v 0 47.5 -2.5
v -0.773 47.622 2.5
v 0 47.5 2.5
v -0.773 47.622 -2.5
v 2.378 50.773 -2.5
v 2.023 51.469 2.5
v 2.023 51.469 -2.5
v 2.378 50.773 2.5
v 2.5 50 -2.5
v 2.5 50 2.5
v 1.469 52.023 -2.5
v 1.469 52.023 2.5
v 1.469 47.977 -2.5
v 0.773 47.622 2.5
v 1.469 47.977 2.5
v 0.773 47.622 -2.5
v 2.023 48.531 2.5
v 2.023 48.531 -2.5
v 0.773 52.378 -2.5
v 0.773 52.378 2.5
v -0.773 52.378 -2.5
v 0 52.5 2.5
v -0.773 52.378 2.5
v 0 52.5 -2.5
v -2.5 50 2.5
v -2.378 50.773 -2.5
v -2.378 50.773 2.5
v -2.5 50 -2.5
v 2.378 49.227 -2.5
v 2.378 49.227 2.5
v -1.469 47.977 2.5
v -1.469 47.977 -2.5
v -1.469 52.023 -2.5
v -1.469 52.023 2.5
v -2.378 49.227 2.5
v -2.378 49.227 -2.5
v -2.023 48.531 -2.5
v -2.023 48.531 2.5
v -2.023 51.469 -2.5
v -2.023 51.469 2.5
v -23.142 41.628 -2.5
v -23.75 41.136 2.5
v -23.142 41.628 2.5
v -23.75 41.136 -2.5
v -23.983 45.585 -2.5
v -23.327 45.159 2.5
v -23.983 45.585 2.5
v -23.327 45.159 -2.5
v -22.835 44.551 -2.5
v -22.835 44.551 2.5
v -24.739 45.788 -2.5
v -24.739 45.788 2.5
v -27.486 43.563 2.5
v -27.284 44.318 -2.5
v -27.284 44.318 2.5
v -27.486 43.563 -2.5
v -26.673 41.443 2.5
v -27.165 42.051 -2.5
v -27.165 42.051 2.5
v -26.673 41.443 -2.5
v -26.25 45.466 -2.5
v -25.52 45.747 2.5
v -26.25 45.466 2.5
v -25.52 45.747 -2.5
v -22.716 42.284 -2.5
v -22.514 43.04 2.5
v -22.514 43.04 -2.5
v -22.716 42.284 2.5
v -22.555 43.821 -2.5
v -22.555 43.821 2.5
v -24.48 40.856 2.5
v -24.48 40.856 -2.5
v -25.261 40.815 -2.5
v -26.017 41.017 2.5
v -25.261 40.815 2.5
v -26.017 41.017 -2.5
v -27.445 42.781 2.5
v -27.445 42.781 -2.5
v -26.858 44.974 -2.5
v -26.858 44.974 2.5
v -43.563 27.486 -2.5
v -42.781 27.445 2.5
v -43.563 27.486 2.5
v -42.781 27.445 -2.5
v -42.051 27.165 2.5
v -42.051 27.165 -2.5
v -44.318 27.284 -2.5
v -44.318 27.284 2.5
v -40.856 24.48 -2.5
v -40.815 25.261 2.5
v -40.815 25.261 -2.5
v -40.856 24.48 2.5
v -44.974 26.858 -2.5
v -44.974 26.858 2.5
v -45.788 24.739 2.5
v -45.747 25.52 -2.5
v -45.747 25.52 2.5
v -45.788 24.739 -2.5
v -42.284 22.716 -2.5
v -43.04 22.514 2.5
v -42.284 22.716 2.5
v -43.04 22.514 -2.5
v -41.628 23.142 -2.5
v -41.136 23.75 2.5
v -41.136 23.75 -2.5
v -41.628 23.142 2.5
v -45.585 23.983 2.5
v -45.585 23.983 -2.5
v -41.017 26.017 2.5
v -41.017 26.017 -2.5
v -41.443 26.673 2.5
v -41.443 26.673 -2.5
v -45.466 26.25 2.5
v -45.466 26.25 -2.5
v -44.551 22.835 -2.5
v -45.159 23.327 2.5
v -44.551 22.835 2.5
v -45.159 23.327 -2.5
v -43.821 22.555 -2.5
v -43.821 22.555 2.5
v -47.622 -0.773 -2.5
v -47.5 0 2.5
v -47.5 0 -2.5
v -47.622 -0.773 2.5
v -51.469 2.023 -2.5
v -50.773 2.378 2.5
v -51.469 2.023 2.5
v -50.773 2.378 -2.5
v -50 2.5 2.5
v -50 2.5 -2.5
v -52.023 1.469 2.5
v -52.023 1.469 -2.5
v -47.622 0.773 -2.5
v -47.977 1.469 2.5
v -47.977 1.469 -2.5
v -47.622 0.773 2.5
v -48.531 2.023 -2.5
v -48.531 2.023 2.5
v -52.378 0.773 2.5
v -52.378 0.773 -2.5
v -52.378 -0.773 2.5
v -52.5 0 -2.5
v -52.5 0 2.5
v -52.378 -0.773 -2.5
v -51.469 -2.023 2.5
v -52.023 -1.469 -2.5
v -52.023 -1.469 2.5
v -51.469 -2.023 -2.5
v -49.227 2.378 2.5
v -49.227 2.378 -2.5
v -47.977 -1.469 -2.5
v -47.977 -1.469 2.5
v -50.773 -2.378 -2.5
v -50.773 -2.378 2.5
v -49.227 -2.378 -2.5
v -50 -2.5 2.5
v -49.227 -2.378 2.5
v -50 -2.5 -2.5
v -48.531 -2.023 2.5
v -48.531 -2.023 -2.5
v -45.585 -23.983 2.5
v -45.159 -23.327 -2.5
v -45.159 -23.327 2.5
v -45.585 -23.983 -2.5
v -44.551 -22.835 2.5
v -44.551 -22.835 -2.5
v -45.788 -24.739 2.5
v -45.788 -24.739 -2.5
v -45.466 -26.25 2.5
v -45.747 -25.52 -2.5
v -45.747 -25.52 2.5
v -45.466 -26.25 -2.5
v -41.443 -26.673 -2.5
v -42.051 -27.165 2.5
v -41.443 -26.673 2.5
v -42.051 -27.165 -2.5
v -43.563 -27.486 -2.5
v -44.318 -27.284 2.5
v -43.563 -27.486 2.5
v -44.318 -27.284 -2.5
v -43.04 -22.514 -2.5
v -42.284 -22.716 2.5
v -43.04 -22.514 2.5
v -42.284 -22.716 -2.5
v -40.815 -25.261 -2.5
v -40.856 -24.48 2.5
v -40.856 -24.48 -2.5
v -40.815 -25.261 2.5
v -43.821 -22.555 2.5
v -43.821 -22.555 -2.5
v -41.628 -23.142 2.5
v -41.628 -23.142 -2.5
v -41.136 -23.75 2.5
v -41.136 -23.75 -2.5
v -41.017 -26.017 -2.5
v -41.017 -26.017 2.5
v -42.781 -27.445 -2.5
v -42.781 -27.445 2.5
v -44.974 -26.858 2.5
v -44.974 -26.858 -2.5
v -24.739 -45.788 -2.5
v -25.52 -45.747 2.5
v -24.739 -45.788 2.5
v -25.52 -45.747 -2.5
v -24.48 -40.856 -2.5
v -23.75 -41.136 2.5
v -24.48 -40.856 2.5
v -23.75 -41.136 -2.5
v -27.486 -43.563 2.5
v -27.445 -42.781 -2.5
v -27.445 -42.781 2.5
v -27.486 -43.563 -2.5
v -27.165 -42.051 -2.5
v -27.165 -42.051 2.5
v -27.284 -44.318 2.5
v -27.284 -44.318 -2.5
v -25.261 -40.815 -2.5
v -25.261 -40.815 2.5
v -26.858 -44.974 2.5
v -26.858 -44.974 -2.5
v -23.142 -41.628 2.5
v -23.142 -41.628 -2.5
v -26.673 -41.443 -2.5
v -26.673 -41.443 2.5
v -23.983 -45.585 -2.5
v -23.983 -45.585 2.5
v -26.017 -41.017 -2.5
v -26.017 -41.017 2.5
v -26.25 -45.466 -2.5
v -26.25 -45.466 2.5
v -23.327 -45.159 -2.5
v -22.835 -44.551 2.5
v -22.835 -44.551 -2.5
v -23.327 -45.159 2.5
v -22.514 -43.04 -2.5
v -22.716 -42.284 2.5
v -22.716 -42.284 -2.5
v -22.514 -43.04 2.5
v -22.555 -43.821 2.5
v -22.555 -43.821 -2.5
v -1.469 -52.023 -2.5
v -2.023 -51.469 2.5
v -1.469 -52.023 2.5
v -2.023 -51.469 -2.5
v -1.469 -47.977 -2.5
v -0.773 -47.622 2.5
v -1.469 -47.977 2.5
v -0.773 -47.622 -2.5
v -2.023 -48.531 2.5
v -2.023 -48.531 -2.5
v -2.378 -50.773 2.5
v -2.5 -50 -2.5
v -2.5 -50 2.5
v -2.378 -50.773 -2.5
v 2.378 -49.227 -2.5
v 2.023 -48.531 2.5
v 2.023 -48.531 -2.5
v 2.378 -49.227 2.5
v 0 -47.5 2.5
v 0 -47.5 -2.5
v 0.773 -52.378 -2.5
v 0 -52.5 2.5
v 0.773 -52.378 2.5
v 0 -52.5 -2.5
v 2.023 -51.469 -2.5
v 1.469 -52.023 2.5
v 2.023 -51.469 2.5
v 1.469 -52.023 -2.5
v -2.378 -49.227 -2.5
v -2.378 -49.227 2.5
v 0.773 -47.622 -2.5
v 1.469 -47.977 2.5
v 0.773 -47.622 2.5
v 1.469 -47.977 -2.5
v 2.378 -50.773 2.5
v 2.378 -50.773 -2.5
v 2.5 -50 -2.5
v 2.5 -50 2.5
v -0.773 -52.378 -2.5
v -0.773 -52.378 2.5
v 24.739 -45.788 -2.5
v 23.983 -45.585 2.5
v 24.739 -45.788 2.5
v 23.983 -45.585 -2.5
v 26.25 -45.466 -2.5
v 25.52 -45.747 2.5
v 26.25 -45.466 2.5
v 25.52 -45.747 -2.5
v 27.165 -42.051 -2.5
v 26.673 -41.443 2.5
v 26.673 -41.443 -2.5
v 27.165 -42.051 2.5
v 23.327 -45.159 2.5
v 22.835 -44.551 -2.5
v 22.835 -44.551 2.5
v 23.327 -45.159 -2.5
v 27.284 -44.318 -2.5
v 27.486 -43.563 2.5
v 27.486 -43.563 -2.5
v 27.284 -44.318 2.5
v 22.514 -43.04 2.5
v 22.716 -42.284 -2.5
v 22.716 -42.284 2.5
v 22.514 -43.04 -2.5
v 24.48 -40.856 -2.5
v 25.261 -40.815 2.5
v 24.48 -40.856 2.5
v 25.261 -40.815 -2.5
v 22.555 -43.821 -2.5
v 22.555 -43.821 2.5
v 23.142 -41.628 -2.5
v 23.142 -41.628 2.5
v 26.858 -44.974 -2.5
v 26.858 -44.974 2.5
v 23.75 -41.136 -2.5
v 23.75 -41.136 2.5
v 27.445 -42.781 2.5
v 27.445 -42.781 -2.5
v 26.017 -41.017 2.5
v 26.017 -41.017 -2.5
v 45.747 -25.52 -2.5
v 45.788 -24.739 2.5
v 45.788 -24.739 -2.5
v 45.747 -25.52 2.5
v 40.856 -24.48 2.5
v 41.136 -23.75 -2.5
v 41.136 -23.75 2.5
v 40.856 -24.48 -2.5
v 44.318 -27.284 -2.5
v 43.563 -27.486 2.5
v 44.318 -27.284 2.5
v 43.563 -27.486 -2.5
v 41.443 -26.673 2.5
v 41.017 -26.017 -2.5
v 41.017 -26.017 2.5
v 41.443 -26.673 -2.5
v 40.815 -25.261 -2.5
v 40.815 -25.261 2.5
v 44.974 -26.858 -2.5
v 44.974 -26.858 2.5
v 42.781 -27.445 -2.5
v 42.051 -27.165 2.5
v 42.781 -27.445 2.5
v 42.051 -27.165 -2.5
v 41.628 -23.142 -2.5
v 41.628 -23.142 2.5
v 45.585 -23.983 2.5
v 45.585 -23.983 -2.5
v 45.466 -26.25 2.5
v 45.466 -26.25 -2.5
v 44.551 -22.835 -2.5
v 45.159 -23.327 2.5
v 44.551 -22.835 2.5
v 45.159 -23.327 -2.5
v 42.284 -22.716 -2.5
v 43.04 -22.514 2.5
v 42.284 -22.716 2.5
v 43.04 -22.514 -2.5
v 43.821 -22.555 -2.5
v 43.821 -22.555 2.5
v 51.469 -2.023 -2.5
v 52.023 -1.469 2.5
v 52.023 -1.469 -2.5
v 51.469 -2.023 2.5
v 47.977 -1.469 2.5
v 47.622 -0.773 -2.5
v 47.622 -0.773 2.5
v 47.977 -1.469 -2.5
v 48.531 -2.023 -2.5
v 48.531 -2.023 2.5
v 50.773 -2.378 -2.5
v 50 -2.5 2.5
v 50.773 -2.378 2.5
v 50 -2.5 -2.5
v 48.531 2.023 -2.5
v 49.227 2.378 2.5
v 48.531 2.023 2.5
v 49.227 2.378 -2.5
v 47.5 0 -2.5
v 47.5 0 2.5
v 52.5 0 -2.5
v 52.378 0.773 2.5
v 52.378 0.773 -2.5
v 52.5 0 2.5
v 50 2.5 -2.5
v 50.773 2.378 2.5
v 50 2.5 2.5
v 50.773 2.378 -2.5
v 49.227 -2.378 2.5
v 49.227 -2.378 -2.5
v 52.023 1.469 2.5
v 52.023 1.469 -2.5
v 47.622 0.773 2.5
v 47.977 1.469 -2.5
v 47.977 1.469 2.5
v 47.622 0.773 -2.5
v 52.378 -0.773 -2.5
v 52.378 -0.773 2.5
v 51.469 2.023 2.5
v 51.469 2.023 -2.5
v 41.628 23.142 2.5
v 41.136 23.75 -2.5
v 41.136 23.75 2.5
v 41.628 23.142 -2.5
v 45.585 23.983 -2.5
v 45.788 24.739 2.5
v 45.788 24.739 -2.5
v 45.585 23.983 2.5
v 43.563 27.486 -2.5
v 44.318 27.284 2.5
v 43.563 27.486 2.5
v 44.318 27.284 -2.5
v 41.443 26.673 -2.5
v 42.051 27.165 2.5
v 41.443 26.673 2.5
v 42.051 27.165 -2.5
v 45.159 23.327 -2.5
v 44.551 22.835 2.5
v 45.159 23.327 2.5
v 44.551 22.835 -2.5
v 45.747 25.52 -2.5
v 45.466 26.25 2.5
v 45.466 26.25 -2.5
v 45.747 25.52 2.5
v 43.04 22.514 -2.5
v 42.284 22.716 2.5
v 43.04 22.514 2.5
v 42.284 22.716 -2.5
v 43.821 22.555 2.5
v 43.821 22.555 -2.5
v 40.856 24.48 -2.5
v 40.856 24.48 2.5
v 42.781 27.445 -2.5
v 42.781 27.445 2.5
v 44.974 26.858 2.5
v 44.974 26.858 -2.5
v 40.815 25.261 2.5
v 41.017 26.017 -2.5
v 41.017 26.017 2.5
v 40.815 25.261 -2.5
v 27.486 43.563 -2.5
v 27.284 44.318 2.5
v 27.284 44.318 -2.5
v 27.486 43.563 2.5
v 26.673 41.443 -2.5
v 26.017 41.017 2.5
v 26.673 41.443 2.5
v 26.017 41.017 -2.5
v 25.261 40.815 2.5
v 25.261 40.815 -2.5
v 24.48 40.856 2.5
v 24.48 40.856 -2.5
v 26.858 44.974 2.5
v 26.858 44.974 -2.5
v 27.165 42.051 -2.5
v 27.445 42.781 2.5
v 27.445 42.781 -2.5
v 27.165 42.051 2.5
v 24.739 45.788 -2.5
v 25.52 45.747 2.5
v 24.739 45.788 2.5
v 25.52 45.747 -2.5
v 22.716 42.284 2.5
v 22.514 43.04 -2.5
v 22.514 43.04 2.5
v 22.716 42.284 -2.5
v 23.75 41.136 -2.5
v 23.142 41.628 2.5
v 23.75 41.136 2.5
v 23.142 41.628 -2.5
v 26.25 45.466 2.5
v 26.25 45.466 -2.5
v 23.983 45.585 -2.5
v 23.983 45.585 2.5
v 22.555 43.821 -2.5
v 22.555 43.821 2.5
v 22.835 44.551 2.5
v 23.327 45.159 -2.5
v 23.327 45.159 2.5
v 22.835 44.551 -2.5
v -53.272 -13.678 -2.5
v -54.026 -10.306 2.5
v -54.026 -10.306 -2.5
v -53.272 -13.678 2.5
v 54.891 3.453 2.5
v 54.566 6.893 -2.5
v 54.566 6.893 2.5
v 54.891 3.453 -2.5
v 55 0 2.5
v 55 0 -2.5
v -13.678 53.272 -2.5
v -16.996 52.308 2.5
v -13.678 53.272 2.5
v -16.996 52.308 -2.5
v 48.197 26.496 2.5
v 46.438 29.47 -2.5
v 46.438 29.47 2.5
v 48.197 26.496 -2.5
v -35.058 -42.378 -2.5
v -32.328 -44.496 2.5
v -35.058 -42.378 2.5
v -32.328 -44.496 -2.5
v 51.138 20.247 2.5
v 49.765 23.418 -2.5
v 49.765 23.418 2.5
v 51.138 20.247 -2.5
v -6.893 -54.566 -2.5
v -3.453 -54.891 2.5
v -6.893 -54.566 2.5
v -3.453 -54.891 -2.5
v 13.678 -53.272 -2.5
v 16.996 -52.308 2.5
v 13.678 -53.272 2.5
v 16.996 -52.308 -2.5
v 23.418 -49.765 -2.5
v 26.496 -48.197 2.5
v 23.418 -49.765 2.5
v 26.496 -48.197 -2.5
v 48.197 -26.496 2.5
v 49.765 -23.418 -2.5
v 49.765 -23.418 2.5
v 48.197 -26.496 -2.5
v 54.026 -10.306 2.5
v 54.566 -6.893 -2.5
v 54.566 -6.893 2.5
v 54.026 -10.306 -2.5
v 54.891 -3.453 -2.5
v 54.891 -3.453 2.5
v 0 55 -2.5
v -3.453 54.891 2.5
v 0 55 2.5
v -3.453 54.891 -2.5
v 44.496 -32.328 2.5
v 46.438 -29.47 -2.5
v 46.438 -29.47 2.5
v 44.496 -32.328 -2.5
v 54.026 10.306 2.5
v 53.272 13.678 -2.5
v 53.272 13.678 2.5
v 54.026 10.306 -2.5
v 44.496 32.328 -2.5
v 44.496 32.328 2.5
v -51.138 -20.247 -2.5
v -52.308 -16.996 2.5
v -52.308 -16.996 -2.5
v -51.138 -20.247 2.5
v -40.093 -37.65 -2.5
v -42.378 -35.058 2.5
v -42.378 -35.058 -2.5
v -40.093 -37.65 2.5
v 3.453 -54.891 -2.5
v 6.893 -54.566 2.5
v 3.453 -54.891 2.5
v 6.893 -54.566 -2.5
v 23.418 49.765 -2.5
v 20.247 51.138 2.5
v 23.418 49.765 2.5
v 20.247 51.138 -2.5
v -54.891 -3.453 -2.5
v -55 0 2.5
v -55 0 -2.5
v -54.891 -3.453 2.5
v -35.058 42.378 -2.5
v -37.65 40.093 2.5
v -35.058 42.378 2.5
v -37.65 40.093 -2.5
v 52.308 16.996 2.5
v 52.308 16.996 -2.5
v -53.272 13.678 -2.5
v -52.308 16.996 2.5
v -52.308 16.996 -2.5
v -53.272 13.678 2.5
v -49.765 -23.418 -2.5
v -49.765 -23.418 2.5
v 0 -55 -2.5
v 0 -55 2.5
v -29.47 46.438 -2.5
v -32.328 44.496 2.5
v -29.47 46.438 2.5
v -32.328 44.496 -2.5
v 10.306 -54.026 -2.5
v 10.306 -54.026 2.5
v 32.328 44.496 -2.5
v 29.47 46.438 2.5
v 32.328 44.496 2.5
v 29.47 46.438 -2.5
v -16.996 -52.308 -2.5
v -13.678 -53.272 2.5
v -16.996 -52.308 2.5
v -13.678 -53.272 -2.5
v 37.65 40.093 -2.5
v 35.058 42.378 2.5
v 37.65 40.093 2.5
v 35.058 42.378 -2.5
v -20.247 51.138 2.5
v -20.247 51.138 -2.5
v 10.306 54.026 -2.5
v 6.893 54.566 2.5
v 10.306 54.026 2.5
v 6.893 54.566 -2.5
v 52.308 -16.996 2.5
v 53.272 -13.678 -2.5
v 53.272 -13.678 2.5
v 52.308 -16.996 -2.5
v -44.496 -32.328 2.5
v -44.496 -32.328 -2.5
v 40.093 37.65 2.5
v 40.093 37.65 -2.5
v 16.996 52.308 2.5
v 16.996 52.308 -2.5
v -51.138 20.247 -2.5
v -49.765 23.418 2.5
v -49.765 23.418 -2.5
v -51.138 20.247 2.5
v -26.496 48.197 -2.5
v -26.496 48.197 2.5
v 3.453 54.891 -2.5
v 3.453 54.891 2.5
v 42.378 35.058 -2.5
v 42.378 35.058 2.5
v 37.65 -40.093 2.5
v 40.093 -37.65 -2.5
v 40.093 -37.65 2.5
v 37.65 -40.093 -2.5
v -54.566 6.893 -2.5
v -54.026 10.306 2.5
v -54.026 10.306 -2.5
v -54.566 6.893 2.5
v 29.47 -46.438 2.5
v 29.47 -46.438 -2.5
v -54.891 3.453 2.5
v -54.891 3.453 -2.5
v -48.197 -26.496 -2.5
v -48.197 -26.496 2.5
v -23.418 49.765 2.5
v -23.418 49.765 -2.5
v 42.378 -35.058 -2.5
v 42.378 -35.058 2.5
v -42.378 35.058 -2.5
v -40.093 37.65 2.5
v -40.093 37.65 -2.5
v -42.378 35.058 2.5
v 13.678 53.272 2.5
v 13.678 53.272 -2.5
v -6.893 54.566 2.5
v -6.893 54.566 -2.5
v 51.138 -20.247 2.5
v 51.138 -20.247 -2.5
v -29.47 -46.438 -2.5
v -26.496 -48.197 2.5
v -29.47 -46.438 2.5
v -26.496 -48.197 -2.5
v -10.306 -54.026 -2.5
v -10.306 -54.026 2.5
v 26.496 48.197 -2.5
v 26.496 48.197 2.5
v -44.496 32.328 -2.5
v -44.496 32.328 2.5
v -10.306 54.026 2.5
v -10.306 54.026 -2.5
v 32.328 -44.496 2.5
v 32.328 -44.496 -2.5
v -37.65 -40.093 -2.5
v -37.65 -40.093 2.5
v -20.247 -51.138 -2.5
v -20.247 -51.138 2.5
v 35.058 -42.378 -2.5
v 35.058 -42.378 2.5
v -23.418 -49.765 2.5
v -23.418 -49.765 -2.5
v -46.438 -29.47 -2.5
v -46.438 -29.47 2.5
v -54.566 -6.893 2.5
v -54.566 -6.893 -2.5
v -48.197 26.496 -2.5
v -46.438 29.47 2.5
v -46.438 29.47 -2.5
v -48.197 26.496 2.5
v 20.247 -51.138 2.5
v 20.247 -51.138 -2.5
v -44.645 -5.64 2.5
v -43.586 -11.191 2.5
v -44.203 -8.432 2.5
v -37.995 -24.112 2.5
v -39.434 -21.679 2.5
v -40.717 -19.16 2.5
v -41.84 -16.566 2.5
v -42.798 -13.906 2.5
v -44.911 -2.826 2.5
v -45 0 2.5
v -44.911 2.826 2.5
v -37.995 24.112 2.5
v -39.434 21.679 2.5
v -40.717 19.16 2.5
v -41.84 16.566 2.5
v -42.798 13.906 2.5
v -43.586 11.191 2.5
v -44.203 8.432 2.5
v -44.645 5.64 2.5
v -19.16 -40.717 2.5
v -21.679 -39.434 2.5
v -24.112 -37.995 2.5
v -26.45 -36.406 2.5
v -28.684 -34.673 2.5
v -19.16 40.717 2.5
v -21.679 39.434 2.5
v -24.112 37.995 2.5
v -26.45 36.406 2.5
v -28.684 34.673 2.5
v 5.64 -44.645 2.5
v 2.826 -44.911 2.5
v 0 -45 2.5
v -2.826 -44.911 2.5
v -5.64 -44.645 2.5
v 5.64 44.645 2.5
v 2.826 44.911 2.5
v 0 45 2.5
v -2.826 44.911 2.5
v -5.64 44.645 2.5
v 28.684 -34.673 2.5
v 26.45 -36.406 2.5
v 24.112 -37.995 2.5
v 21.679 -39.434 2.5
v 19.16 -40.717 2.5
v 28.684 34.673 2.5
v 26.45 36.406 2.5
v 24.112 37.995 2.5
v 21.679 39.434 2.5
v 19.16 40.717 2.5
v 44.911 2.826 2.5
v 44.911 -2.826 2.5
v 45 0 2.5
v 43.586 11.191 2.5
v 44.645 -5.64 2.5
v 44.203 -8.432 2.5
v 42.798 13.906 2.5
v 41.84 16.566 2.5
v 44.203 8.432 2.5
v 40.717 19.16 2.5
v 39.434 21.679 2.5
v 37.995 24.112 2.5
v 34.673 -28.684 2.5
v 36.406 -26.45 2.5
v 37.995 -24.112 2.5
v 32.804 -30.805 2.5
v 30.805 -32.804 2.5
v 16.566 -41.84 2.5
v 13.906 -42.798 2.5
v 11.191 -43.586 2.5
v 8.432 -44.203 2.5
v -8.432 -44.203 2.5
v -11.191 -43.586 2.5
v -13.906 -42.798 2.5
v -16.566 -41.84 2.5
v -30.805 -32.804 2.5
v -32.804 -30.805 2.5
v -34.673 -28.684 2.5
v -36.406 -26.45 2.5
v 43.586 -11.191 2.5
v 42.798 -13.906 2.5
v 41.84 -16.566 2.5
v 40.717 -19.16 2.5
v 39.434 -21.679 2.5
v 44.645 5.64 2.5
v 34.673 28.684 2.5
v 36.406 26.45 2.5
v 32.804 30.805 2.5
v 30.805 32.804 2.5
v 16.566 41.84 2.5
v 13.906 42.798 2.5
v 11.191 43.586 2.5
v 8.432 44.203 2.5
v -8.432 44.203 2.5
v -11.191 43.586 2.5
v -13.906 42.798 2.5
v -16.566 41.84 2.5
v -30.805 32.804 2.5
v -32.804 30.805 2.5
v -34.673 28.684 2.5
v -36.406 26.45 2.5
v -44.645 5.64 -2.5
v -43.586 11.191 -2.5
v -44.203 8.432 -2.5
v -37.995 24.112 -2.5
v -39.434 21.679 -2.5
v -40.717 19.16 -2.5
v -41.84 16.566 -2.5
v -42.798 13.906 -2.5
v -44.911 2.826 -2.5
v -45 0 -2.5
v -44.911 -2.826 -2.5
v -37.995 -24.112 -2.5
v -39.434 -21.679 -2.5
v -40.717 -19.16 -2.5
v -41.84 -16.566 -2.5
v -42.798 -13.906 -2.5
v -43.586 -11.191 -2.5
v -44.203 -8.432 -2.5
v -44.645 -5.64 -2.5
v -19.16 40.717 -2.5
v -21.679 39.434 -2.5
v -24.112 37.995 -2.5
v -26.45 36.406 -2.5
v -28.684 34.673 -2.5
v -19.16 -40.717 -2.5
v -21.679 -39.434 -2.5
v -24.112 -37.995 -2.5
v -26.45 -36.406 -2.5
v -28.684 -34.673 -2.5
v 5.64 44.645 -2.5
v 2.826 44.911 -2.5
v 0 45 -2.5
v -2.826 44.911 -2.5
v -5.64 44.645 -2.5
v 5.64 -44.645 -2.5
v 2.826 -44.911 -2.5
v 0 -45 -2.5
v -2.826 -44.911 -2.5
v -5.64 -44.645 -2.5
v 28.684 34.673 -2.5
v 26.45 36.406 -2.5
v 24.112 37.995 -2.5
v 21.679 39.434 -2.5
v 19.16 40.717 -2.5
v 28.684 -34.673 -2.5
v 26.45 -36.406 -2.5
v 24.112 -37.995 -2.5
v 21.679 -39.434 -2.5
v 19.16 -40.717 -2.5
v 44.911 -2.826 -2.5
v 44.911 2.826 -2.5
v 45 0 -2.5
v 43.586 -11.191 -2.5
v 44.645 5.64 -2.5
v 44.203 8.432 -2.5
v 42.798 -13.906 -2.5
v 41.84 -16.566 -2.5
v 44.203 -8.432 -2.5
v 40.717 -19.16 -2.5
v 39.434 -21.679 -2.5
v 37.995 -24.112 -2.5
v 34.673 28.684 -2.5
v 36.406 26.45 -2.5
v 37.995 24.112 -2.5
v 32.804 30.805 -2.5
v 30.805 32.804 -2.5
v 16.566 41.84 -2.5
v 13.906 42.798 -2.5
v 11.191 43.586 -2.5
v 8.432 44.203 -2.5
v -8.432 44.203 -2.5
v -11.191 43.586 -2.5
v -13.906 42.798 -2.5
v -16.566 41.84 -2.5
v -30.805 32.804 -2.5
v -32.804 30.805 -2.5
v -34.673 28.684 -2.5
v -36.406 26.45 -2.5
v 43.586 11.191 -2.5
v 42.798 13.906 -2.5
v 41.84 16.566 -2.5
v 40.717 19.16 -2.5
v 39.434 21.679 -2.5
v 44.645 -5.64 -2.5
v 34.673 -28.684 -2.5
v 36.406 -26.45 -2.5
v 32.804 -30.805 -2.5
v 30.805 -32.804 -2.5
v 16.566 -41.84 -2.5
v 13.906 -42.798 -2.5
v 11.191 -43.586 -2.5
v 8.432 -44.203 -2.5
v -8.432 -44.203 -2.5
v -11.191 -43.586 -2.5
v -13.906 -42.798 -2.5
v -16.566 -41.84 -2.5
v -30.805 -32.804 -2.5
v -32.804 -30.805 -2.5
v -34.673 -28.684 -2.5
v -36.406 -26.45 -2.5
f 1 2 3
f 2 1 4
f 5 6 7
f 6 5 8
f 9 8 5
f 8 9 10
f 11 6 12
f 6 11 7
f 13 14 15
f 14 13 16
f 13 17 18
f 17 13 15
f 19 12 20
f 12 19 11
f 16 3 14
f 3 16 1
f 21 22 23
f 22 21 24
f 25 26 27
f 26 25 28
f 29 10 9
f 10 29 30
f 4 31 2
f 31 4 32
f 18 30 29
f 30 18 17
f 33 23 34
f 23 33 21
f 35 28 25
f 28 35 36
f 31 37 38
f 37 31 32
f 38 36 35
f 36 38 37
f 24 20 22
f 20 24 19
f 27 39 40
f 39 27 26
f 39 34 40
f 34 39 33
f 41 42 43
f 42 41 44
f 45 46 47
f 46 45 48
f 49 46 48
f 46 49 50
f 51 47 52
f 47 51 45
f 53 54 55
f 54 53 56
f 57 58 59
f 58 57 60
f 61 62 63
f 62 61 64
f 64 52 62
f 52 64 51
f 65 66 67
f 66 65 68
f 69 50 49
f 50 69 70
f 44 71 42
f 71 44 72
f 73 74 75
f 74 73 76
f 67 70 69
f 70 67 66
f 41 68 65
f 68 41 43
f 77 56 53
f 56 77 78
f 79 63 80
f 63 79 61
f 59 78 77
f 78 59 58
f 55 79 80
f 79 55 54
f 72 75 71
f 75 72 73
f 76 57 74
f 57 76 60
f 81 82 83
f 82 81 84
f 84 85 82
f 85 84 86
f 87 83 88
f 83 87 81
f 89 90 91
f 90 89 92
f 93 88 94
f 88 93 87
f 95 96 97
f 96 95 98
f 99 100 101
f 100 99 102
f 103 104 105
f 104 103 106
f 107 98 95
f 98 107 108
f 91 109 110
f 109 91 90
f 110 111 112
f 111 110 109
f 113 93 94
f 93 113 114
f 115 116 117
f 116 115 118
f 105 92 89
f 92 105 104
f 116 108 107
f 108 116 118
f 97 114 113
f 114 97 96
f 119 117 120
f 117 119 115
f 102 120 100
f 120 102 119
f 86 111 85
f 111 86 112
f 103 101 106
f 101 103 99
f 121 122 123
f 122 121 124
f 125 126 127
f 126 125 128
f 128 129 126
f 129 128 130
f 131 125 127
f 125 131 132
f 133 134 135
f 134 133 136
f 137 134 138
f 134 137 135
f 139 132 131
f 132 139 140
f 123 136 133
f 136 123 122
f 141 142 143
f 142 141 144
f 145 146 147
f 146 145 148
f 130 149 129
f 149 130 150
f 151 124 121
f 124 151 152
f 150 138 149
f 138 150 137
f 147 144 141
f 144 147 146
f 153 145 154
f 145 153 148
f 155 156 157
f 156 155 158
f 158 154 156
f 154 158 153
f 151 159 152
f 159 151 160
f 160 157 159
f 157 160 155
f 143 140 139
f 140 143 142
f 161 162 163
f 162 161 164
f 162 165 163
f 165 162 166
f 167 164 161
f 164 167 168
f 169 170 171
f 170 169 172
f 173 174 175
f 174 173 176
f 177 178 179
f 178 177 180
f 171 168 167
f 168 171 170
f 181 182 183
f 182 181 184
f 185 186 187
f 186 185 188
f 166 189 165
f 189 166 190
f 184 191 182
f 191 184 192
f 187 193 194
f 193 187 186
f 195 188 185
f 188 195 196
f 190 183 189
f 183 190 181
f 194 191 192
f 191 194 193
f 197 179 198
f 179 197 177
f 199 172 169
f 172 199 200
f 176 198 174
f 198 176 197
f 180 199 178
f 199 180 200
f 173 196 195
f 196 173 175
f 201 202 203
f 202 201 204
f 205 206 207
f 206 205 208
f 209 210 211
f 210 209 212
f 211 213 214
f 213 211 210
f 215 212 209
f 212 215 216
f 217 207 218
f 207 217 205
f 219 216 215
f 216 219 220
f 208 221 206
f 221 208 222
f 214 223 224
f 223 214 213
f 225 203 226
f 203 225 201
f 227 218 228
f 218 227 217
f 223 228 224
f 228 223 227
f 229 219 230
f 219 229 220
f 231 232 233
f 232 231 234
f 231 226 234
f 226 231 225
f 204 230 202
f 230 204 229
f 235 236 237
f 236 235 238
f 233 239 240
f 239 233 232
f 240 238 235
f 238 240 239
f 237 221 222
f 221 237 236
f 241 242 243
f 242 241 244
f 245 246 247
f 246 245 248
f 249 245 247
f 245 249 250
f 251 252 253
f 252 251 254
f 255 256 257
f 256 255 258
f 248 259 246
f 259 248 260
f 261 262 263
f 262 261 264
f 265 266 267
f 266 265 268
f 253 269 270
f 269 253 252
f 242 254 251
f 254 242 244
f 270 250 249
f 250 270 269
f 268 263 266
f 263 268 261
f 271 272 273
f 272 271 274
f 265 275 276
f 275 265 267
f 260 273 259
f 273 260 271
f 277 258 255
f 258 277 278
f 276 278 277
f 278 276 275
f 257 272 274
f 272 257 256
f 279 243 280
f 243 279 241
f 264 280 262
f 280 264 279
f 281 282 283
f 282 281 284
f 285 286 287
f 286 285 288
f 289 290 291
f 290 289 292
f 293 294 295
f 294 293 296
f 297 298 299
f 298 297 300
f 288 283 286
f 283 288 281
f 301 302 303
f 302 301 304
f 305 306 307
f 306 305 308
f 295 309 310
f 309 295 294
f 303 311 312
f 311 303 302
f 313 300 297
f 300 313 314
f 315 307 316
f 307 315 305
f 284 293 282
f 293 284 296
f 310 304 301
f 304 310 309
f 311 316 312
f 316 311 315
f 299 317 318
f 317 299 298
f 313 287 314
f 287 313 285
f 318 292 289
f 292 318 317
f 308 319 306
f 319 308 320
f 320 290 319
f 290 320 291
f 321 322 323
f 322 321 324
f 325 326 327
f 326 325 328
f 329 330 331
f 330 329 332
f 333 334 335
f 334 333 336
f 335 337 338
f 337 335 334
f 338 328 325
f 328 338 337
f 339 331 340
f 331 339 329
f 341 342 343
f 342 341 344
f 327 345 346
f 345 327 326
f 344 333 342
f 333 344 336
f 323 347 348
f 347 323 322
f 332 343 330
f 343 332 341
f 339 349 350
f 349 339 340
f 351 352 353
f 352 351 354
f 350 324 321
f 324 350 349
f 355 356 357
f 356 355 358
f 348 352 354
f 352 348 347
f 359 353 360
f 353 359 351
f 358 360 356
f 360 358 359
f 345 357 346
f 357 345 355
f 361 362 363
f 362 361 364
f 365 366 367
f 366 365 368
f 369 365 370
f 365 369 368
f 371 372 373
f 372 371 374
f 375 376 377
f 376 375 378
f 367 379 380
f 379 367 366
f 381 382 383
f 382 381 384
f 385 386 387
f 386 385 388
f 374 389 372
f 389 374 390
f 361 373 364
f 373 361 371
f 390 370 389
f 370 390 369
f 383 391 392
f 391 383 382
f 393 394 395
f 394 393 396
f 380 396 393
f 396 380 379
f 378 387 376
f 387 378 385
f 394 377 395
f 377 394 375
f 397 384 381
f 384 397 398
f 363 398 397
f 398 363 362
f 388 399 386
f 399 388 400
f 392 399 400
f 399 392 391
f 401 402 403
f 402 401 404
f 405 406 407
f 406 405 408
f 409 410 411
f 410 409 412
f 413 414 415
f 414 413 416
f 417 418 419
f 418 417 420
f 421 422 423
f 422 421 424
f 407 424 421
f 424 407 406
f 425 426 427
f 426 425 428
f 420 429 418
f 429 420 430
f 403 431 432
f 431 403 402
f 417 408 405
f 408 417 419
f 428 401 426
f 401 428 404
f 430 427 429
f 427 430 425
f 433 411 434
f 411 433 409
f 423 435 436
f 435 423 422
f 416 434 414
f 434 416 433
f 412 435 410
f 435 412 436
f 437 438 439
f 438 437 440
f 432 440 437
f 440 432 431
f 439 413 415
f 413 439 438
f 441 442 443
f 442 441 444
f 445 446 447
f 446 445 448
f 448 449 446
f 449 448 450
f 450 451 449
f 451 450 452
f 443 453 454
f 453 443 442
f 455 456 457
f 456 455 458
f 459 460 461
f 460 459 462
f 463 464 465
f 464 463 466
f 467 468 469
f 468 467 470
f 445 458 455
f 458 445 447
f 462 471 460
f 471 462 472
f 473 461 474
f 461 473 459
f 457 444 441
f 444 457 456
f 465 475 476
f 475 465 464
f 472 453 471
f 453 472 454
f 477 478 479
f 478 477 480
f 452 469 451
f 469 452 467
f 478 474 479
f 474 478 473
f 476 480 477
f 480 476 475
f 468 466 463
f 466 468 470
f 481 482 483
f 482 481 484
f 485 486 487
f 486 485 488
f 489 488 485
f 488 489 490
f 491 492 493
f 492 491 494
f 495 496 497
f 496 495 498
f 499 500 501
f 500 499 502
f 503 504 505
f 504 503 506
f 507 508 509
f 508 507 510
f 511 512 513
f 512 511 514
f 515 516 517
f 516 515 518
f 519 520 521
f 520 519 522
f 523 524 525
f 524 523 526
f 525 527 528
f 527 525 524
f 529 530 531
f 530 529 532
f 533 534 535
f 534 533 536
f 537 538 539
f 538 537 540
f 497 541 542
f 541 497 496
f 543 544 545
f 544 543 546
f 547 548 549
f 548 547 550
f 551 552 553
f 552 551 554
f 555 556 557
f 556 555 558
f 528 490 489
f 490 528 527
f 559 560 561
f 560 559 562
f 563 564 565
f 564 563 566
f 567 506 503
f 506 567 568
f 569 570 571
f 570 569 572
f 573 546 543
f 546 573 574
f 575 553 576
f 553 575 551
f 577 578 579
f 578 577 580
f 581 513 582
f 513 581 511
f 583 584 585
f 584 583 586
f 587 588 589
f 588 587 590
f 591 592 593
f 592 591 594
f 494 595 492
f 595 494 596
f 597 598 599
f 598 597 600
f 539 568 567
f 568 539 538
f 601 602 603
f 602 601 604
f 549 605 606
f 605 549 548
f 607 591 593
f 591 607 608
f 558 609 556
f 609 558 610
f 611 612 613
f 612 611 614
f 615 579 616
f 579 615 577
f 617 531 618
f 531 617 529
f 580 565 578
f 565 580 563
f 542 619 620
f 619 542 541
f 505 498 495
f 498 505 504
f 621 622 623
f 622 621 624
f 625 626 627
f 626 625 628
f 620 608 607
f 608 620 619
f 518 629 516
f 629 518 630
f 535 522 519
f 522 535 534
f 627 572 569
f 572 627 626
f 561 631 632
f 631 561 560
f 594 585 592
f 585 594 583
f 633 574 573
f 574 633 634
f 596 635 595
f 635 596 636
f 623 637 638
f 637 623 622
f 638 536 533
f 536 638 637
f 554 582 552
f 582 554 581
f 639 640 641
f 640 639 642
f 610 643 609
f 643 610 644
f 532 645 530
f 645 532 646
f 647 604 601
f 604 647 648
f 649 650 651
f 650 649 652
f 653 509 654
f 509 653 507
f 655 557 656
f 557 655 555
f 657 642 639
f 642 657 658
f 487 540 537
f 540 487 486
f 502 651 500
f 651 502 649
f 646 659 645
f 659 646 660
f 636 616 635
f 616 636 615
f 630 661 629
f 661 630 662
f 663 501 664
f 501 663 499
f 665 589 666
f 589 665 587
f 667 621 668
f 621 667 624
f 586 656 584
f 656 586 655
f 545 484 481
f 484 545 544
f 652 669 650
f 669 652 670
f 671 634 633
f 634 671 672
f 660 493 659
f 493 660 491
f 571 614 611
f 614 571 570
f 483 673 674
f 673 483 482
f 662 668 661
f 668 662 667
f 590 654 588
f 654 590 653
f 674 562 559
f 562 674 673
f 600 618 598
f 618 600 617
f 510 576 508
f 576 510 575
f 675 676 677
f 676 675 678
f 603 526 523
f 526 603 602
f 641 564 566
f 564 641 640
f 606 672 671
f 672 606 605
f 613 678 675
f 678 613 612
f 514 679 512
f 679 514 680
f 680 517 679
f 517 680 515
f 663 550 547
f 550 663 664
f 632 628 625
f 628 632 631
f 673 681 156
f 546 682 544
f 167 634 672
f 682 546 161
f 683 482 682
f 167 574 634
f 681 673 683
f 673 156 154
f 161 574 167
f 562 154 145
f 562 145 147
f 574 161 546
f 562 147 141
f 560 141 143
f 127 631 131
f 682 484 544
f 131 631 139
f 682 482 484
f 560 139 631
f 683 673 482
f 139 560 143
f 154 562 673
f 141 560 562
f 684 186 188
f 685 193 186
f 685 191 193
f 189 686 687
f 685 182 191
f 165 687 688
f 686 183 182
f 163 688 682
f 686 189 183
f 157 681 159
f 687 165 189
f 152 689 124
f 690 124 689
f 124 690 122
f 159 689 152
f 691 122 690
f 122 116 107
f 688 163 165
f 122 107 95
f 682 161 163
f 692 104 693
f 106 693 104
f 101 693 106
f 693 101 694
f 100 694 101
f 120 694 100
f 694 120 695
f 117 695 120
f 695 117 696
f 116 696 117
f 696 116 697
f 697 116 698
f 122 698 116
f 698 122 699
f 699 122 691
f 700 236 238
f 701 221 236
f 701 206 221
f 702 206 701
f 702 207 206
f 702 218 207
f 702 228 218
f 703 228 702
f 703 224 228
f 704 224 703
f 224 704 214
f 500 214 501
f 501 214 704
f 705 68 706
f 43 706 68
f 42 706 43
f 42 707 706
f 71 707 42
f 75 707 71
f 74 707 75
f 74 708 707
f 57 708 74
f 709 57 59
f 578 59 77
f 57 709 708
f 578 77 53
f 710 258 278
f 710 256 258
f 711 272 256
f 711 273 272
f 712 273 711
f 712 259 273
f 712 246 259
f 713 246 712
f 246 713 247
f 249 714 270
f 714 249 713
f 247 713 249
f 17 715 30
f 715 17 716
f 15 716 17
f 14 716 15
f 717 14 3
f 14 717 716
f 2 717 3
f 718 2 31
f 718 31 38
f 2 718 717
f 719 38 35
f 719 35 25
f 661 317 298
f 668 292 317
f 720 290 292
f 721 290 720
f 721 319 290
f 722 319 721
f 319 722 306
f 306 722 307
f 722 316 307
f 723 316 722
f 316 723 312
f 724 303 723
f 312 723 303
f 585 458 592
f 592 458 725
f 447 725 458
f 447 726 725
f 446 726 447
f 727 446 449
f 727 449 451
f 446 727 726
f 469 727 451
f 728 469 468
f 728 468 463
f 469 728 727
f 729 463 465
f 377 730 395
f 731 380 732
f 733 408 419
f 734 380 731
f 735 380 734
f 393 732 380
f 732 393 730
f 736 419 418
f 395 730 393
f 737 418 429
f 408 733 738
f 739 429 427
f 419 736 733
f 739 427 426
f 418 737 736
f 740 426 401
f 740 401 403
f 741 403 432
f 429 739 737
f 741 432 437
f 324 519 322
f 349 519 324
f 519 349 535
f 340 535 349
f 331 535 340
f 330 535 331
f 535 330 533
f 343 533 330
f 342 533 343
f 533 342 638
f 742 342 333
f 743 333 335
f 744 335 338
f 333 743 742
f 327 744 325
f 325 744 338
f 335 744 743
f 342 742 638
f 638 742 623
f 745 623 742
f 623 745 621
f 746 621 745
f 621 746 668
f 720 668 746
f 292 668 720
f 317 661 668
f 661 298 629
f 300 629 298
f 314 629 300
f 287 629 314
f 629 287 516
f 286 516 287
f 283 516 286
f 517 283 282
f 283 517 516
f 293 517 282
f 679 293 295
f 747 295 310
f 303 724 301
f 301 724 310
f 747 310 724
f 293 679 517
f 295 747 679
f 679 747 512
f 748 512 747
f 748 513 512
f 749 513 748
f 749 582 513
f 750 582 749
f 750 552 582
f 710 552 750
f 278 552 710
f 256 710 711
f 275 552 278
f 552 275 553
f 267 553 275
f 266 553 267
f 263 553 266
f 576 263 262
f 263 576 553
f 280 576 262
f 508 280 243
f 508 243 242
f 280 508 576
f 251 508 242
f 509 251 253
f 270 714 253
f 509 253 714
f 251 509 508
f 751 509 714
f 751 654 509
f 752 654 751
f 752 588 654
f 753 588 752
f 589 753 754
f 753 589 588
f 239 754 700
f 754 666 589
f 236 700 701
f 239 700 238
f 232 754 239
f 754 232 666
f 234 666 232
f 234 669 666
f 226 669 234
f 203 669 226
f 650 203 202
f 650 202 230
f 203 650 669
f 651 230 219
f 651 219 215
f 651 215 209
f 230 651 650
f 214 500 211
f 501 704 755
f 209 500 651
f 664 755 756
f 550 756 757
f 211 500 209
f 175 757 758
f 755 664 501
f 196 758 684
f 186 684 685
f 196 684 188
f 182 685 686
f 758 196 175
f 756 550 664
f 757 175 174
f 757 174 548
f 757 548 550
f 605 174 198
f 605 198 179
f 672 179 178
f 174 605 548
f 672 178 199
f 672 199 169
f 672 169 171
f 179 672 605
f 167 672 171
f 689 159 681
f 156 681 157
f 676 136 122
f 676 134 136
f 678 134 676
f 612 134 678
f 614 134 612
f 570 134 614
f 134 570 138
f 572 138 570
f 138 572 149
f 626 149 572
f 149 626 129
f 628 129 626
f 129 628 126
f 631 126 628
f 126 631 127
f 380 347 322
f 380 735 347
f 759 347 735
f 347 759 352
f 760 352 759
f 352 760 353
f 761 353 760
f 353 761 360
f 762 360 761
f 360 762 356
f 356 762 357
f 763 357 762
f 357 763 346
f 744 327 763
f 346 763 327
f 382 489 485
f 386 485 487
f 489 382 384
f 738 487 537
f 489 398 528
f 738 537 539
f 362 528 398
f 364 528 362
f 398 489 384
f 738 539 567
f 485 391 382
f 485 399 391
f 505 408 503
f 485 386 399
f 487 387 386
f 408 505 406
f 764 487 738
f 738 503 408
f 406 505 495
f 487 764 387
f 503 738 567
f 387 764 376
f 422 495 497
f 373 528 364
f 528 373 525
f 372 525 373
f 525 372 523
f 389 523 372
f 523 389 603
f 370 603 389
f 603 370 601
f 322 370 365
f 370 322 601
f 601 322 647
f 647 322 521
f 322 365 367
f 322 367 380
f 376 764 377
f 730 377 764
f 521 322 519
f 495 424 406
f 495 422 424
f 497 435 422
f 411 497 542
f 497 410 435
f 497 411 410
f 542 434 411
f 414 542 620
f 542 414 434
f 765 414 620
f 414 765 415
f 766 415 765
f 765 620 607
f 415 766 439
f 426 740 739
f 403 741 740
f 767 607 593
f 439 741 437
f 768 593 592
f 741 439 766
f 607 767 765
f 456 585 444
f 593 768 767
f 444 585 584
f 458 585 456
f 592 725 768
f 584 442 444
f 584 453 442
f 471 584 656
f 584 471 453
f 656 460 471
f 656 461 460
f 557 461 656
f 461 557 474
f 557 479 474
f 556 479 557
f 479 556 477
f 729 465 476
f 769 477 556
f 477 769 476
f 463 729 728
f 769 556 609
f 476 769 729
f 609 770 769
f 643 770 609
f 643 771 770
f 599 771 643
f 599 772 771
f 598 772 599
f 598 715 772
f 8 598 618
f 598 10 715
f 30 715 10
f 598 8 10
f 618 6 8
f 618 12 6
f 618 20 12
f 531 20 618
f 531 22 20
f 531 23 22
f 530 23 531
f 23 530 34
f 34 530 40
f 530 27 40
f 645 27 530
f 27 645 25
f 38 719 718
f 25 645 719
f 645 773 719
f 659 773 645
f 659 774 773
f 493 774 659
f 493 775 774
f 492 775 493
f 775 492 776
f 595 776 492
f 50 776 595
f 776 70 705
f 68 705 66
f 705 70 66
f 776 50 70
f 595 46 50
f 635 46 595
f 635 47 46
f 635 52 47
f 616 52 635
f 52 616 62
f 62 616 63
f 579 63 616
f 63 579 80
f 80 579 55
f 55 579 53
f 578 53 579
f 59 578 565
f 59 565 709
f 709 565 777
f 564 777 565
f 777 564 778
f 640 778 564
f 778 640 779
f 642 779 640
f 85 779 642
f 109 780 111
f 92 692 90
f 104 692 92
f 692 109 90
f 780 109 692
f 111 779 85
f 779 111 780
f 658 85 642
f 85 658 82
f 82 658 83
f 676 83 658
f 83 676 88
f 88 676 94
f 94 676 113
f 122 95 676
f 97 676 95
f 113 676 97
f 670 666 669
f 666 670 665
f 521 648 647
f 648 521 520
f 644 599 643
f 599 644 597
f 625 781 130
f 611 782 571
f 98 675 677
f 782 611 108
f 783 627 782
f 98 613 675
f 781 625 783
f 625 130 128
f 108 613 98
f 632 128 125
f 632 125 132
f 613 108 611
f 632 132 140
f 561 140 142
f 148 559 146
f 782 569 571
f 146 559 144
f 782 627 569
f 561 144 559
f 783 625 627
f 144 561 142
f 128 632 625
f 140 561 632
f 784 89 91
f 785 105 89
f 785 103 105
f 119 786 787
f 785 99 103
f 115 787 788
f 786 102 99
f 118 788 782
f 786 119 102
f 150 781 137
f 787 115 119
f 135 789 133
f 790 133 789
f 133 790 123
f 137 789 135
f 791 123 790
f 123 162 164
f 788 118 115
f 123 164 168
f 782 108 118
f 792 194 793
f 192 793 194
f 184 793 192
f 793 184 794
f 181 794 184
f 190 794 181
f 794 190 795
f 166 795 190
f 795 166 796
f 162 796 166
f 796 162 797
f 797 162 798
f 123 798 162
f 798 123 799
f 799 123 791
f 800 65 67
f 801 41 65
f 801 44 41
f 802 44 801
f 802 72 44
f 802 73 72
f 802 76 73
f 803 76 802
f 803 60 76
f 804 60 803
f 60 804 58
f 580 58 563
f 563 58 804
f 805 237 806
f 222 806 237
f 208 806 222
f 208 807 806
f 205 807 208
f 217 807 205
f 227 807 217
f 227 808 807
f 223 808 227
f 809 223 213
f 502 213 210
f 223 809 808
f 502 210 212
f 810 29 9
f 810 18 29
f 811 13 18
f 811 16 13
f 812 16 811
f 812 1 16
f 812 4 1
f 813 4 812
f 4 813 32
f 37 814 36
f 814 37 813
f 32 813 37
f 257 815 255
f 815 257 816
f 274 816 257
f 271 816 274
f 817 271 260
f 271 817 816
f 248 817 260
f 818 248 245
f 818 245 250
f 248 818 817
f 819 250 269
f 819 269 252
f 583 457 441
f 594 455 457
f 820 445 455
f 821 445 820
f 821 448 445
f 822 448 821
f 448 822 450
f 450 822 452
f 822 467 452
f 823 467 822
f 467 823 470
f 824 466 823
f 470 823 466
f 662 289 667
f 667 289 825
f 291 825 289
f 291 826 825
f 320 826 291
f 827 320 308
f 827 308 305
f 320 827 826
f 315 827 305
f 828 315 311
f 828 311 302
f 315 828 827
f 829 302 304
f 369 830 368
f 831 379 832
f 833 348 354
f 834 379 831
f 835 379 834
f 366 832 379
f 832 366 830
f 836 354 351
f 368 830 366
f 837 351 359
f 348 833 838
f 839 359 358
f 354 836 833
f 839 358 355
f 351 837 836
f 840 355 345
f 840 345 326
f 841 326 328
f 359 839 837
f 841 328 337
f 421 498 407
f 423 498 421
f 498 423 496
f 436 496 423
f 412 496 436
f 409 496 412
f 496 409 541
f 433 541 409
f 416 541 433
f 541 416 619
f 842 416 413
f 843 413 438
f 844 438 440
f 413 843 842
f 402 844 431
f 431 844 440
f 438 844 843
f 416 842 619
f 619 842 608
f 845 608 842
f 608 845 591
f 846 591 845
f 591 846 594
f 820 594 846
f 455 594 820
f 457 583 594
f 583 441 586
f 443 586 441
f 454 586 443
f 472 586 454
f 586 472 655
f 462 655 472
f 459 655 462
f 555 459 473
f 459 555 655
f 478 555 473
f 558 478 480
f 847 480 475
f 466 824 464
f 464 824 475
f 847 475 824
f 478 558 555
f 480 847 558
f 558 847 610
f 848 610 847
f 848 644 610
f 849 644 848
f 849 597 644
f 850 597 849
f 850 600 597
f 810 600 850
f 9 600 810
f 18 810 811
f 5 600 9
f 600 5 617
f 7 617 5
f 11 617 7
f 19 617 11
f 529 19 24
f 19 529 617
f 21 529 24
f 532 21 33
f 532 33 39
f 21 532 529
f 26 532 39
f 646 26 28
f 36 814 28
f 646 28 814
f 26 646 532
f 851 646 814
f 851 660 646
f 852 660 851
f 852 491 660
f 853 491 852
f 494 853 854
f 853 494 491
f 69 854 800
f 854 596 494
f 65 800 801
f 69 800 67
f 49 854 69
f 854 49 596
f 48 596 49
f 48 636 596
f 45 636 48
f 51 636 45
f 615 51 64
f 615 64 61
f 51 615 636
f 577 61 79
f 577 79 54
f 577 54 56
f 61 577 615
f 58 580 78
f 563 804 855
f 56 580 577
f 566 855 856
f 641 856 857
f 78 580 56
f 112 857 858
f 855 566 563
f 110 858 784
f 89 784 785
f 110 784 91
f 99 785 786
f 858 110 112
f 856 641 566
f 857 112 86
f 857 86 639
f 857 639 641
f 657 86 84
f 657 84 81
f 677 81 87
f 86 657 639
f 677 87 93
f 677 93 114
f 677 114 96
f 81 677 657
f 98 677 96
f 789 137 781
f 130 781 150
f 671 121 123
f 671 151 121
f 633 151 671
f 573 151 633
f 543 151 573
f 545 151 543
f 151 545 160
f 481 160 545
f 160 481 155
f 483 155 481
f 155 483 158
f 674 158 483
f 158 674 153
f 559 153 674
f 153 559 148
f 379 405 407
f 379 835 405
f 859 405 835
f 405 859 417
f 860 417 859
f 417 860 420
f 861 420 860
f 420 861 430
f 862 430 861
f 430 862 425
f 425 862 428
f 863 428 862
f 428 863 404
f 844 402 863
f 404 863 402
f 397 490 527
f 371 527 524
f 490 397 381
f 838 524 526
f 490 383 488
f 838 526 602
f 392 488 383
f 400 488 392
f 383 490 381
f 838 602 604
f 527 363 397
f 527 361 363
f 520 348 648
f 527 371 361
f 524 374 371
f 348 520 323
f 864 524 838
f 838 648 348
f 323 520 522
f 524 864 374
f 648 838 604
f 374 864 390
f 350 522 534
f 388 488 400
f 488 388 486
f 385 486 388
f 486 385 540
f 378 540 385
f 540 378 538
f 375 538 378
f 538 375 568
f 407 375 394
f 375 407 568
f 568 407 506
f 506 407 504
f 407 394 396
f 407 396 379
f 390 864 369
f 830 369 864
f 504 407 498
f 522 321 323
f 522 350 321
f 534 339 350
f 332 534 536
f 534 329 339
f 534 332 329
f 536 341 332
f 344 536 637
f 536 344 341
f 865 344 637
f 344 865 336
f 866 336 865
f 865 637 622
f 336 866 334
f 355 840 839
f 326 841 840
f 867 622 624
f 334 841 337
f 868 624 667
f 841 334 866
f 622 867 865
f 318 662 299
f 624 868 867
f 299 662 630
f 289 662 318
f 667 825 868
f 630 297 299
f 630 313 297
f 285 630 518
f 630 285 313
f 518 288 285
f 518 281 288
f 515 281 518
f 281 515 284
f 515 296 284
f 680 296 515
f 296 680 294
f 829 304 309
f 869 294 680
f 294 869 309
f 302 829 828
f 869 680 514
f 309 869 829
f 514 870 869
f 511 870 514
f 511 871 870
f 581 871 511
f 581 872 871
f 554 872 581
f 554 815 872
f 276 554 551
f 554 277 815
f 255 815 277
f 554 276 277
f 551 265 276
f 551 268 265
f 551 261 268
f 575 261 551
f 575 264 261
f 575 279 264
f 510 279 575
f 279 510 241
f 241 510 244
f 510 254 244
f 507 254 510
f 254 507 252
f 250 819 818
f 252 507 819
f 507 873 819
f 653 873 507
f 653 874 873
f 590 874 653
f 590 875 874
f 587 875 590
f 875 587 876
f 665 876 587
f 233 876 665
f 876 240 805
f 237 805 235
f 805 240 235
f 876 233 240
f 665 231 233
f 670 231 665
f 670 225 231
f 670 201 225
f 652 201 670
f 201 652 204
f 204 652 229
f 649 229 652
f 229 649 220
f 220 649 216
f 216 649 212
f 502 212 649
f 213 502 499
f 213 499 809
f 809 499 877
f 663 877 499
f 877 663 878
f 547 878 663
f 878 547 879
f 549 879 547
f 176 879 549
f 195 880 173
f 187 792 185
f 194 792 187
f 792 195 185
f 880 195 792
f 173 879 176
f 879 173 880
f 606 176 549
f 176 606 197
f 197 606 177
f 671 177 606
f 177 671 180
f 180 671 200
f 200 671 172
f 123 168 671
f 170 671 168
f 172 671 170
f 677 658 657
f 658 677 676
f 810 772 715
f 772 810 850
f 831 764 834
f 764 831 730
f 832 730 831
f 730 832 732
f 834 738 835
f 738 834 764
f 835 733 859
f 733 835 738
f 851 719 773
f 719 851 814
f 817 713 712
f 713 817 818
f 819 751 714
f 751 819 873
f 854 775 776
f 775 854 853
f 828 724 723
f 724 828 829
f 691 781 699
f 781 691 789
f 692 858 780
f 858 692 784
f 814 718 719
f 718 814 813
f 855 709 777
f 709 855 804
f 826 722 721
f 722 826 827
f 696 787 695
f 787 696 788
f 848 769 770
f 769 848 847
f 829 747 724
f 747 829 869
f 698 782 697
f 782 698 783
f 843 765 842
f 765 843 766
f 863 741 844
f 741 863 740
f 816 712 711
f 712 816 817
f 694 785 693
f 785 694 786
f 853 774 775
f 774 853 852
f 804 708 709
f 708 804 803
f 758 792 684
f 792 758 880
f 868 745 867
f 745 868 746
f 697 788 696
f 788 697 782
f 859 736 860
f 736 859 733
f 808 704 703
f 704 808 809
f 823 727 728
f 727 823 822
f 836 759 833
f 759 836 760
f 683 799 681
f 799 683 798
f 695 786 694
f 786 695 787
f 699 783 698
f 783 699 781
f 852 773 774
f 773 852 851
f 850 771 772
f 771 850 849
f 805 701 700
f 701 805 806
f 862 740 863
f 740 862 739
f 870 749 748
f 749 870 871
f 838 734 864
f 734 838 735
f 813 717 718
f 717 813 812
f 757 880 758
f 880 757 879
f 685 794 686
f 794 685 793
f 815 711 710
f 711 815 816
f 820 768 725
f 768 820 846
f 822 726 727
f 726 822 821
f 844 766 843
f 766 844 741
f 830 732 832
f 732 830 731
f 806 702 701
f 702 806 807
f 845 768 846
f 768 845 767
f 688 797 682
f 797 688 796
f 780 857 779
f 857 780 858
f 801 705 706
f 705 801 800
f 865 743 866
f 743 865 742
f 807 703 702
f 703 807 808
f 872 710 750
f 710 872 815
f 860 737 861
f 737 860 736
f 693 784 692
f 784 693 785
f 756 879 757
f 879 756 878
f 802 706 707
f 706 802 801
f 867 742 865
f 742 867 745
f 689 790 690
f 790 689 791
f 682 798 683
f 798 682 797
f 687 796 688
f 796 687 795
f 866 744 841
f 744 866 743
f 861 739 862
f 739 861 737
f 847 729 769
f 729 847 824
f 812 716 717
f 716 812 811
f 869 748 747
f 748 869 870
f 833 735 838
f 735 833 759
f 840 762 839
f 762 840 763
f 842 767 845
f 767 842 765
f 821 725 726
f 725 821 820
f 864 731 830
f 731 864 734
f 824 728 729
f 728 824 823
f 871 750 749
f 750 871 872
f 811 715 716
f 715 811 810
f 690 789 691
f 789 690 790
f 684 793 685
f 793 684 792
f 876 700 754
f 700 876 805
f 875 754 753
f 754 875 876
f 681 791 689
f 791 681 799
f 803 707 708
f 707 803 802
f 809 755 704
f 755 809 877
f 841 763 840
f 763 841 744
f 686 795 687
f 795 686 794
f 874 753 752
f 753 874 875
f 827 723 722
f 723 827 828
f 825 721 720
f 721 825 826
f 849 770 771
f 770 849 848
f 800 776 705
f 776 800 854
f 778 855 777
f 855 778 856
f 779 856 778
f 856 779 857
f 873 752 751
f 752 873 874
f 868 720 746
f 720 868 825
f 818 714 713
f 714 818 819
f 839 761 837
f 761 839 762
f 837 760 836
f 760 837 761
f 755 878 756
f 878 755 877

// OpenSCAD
difference(){
cylinder(5,r=55,center=true,$fn=100);

cylinder(10,r=45,center=true,$fn=100);

for(j=[0:11])rotate([0,0,360*j/12])
    translate([0,50,0])cylinder(20,r=2.5,center=true,$fn=20);
}
